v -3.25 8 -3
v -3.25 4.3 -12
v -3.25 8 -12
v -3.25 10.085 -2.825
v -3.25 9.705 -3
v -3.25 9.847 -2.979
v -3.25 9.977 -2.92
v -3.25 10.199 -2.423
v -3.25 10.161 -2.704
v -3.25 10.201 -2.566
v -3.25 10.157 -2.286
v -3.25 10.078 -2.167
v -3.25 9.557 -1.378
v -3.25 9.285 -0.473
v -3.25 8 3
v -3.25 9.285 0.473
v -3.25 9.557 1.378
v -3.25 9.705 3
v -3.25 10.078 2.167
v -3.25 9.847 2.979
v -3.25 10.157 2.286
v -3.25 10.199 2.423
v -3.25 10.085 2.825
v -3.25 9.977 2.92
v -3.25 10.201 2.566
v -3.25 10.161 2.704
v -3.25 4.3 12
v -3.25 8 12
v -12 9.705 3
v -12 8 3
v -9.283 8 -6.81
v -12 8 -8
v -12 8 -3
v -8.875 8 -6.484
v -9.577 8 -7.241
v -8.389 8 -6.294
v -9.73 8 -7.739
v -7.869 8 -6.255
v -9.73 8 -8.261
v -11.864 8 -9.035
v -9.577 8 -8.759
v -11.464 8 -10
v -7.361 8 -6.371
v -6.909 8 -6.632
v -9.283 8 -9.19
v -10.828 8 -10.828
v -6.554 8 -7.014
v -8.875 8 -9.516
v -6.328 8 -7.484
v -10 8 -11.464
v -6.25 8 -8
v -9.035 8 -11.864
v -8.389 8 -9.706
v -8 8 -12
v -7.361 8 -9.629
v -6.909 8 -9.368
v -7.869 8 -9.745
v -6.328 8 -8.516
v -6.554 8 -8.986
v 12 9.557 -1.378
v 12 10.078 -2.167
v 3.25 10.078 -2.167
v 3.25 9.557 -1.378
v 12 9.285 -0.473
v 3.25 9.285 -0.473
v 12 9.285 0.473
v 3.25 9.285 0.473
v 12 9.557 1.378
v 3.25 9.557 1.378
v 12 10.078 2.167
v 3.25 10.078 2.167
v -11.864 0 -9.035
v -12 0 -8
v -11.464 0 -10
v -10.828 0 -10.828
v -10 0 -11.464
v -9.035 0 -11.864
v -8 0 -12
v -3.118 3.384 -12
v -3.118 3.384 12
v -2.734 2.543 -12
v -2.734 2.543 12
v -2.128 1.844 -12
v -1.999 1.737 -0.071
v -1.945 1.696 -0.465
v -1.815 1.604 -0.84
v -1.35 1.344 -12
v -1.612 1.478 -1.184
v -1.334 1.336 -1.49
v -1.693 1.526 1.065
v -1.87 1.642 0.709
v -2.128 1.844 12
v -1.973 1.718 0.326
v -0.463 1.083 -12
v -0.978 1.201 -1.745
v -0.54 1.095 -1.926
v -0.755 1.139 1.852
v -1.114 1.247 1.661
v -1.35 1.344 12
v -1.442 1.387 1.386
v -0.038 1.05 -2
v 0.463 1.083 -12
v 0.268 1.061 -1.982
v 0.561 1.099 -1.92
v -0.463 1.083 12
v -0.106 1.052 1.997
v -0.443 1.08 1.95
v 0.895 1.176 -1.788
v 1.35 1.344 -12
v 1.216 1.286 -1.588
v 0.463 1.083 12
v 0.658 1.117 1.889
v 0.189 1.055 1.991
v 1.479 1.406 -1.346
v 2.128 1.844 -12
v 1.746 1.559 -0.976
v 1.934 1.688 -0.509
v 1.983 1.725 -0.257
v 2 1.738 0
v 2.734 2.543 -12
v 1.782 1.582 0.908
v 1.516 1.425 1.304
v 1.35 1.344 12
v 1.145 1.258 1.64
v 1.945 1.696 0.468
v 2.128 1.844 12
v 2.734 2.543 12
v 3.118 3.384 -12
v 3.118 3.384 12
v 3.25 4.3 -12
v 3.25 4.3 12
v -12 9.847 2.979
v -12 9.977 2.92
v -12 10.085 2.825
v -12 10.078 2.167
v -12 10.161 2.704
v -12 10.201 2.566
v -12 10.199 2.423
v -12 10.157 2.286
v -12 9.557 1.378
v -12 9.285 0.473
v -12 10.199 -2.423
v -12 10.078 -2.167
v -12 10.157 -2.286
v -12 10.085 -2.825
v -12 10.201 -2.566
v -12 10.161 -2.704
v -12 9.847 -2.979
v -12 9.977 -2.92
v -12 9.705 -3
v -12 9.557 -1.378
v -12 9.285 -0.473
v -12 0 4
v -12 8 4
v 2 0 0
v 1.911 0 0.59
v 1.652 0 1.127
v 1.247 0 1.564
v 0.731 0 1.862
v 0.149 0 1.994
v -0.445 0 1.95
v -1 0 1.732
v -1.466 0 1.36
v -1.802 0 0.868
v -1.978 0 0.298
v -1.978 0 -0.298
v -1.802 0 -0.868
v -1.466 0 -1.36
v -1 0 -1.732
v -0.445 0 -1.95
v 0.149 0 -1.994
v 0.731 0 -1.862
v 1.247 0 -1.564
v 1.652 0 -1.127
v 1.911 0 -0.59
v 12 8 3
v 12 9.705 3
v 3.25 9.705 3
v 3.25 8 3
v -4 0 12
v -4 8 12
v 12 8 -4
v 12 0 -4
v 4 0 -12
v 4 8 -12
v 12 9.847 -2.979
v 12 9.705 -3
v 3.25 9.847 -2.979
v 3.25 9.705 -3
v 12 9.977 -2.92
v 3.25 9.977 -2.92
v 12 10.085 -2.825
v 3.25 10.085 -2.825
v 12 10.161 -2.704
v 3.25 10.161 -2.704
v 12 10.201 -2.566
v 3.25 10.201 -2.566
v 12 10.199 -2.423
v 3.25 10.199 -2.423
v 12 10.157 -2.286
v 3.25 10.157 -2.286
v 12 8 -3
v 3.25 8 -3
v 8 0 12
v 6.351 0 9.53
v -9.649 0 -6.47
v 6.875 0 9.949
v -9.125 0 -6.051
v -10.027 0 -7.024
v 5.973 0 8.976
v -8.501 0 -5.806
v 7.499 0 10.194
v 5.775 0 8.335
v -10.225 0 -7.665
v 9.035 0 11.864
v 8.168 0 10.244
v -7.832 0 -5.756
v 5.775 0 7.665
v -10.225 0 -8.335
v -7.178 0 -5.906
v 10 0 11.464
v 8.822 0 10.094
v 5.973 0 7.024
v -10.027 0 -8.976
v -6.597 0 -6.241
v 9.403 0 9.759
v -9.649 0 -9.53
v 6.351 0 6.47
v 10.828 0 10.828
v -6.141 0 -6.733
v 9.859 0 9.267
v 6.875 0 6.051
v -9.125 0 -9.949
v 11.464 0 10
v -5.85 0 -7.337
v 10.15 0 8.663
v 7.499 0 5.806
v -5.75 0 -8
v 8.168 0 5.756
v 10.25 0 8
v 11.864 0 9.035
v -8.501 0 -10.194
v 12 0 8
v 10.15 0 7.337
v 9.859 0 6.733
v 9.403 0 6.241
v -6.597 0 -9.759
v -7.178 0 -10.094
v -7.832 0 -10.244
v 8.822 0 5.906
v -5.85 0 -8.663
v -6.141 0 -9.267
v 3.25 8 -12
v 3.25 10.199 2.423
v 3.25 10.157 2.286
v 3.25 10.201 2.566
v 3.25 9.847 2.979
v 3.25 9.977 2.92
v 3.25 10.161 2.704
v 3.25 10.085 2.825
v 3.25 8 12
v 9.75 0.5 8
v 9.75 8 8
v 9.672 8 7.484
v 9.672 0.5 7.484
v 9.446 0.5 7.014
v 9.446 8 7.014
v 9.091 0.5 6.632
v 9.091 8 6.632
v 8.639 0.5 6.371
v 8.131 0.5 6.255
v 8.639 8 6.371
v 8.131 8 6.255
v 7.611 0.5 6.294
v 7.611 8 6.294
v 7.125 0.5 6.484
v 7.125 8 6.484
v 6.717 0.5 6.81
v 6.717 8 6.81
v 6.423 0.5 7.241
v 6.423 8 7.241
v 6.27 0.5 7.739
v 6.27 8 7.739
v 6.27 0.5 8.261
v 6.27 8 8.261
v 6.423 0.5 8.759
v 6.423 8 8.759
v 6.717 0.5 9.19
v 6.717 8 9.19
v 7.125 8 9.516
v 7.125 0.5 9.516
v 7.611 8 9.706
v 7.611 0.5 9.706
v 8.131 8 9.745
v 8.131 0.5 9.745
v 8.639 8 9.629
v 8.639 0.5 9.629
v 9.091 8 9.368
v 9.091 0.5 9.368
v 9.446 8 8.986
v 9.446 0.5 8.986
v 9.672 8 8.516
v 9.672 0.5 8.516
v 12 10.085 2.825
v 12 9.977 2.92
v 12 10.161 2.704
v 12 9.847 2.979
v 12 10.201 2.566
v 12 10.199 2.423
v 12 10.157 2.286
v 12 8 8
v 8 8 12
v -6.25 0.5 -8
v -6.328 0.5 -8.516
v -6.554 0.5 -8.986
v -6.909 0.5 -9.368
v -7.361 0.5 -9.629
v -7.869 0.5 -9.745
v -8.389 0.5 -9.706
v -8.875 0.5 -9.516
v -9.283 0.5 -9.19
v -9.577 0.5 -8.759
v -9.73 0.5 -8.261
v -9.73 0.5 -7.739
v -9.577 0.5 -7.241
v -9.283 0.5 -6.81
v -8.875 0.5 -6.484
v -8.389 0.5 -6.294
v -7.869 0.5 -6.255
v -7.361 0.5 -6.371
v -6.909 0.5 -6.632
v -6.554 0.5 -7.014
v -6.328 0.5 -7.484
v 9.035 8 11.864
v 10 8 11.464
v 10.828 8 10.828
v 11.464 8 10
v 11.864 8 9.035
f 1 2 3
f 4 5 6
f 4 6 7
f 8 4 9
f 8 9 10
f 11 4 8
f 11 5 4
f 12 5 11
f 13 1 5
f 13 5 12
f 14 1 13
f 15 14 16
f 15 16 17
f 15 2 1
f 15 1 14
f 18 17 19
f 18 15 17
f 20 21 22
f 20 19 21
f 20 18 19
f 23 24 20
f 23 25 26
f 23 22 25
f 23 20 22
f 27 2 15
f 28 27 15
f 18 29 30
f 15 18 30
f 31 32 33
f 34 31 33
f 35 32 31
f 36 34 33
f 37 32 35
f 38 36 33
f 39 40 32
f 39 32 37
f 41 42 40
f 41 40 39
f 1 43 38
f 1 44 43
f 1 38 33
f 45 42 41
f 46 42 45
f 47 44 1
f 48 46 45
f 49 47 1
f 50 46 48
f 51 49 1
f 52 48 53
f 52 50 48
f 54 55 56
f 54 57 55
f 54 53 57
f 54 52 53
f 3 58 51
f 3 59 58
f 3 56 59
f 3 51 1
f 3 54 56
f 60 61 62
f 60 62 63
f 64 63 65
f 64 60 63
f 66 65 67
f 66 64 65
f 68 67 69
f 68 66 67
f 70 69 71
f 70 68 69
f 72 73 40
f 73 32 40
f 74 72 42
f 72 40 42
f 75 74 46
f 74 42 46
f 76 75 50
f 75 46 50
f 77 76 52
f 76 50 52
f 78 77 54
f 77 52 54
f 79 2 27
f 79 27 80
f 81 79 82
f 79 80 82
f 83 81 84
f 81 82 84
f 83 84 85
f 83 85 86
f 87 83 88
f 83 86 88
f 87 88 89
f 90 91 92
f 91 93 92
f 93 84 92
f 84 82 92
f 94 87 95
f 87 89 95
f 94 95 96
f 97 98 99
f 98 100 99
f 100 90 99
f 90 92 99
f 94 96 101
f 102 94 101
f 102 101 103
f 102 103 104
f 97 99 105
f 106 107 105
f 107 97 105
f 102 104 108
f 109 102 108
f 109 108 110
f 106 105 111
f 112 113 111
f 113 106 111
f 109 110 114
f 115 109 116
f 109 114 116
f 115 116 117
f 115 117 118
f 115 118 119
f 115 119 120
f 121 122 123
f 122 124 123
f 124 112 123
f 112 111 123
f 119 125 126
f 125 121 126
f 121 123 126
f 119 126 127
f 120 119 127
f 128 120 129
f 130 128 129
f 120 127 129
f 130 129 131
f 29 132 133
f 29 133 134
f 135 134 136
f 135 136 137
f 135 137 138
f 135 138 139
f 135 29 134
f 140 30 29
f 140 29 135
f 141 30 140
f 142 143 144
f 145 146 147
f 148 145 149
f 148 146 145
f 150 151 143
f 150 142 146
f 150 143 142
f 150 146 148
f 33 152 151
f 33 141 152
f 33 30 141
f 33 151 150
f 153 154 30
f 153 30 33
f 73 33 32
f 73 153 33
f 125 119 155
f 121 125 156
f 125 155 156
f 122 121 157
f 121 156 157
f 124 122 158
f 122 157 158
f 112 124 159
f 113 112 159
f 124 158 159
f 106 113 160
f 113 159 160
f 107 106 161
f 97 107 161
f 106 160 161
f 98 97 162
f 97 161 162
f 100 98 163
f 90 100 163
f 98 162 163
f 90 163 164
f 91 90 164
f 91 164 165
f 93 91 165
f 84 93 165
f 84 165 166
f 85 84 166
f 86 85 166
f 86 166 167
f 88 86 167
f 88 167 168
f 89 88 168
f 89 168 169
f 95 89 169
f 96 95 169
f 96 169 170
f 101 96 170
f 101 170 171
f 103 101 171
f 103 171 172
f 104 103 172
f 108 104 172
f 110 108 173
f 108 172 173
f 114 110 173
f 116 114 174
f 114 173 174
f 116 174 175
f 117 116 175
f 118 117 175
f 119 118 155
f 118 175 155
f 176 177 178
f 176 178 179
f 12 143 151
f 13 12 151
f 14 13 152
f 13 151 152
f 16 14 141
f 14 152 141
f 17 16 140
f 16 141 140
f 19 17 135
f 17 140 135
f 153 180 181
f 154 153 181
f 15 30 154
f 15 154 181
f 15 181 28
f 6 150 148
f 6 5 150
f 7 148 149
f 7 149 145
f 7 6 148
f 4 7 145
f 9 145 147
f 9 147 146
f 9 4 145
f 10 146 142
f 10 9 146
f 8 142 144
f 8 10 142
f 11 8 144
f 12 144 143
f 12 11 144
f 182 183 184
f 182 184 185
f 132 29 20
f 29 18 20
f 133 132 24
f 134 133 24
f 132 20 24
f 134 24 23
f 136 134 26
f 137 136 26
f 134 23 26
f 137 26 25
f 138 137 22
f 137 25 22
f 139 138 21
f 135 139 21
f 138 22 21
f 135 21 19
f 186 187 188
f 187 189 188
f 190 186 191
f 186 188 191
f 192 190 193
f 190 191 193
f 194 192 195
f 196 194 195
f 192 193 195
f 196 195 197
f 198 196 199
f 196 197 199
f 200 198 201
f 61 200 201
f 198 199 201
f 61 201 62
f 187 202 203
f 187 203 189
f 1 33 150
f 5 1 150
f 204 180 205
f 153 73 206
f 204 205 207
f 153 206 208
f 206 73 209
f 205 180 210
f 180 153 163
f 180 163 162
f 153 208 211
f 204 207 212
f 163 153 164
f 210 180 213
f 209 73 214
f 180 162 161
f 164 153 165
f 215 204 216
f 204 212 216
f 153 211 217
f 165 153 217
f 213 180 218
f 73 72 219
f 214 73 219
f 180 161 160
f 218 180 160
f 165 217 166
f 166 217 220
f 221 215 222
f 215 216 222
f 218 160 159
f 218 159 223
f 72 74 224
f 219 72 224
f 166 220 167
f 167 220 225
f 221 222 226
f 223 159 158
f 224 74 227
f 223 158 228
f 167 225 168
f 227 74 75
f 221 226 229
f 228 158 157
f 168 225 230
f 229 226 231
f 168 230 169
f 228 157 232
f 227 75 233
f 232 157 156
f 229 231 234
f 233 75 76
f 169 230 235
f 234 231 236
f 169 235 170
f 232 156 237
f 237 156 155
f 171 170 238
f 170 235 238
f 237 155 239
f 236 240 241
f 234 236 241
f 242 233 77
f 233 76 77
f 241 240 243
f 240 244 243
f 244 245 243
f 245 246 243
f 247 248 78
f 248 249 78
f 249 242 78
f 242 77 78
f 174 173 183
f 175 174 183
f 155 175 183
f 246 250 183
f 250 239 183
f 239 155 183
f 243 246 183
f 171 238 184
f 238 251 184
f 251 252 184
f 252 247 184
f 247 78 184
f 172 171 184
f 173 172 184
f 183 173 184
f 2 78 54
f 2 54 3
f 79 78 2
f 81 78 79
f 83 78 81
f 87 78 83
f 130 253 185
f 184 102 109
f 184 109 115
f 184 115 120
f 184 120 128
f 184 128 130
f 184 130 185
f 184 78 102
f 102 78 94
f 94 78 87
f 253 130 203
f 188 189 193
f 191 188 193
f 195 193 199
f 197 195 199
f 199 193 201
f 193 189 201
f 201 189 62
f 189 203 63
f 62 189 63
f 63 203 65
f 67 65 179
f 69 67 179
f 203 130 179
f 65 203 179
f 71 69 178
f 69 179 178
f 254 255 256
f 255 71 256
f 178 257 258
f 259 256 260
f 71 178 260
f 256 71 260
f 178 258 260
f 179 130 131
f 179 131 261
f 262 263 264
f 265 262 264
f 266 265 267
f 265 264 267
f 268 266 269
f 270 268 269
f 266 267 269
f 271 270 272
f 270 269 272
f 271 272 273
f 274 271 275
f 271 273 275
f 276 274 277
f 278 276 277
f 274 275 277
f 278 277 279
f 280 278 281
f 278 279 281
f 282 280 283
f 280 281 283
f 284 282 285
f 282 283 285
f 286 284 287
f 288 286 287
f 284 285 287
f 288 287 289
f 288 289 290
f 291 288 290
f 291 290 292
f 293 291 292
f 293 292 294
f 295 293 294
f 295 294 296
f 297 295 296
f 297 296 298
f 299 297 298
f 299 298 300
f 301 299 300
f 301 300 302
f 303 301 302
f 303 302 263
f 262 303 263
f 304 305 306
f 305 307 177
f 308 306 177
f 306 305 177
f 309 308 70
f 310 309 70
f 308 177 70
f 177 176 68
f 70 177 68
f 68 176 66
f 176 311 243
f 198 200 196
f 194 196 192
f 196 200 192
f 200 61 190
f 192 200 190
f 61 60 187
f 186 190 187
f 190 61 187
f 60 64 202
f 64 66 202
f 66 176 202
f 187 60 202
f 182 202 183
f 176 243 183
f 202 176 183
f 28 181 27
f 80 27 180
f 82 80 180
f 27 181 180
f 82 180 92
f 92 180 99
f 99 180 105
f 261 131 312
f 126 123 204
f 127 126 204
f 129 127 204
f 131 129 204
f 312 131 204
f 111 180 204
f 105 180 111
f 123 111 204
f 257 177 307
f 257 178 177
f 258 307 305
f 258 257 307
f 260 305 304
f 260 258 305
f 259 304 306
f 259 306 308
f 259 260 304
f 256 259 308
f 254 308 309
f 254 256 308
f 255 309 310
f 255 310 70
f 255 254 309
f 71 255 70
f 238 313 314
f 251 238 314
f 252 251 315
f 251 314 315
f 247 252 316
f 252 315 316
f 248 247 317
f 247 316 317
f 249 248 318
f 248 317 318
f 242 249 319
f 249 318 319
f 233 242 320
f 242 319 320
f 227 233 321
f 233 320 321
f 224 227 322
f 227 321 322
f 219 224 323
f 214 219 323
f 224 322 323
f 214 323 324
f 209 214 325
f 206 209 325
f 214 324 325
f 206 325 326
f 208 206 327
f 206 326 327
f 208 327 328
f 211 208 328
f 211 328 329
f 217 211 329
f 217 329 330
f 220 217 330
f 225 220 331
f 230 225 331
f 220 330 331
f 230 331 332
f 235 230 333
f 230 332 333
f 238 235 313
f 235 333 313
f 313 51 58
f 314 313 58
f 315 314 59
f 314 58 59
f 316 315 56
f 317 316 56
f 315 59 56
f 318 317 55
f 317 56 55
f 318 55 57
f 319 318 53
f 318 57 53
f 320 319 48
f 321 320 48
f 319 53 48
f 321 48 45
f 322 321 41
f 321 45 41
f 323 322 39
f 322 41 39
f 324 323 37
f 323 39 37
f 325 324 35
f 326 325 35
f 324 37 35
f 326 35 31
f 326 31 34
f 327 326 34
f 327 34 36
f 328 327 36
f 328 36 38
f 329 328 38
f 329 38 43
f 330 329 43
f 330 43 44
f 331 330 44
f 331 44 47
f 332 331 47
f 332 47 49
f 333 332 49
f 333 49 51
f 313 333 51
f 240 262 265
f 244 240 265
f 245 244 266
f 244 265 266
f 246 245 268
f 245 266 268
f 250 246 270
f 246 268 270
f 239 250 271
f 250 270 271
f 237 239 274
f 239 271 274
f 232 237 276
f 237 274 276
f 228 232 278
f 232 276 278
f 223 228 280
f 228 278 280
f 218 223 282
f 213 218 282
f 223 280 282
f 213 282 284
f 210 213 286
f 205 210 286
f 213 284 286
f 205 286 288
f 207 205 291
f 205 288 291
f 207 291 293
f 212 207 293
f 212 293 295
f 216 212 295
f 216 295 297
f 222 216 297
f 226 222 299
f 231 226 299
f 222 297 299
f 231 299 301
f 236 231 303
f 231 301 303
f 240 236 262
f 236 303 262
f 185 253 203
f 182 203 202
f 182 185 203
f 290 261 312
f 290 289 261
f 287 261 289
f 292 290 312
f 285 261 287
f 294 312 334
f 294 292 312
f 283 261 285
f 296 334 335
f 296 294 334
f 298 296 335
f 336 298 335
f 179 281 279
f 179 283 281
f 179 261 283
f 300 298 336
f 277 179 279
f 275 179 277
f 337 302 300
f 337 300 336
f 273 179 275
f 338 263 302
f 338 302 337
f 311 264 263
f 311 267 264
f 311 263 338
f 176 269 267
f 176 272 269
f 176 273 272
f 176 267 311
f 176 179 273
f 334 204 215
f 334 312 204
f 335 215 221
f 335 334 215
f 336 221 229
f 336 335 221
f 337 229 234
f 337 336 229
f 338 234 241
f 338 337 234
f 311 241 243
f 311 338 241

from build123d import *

# Parameters (mm, degrees)
SKETCH_1_W               = 24
SKETCH_1_H               = 24
EXTRUDE_1_DEPTH          = 8
SKETCH_2_R               = 3.25
SKETCH_2_W               = 6.5
SKETCH_2_H               = 3.7
CUT_EXTRUDE_1_DEPTH      = 1
CUT_EXTRUDE_1_DEPTH_BACK = 25
EXTRUDE_2_DEPTH          = 8.75
SKETCH_5_R               = 1.75
CUT_EXTRUDE_3_DEPTH      = 9
CHAMFER_1_SIZE           = 8
FILLET_1_R               = 4
FILLET_2_R               = 0.5
SKETCH_9_R               = 2
CUT_EXTRUDE_4_DEPTH      = 11.204915028
CHAMFER_3_SIZE           = 0.5


with BuildPart() as part:
    # 草图1 → 凸台-拉伸1 (new body)
    with BuildSketch(Plane(origin=(0, 0, 0), x_dir=(1, 0, 0), z_dir=(0, 1, 0))):
        Rectangle(SKETCH_1_W, SKETCH_1_H)
    extrude(amount=EXTRUDE_1_DEPTH)

    # 草图2 → 切除-拉伸1 (cut, two sides)
    with BuildSketch(Plane.XY.offset(12)) as cut_extrude_1_sk:
        with Locations((0, 4.3)):
            Circle(SKETCH_2_R)
        with Locations((0, 6.15)):
            Rectangle(SKETCH_2_W, SKETCH_2_H)
    extrude(amount=CUT_EXTRUDE_1_DEPTH, mode=Mode.SUBTRACT)
    extrude(cut_extrude_1_sk.sketch, amount=-CUT_EXTRUDE_1_DEPTH_BACK, mode=Mode.SUBTRACT)

    # 草图4 → 凸台-拉伸2 (add)
    with BuildSketch(Plane(origin=(12, 0, 0), x_dir=(0, 0, -1), z_dir=(1, 0, 0))):
        with BuildLine():
            Line((-3, 8), (3, 8))
            Line((3, 8), (3, 11.25))
            ThreePointArc((3, 11.25), (0, 9.25), (-3, 11.25))
            Line((-3, 11.25), (-3, 8))
        make_face()
    extrude_2 = extrude(amount=-EXTRUDE_2_DEPTH)

    # 镜向2: 凸台-拉伸2 across plane
    add(extrude_2.mirror(Plane(origin=(0, 0, 0), x_dir=(0, 0, 1), z_dir=(1, 0, 0))))

    # 草图5 → 切除-拉伸3 (cut, through all)
    with BuildSketch(Plane(origin=(0, 8, 0), x_dir=(1, 0, 0), z_dir=(0, 1, 0))):
        with Locations((-8, 8)):
            Circle(SKETCH_5_R)
        with Locations((8, -8)):
            Circle(SKETCH_5_R)
    extrude(amount=-CUT_EXTRUDE_3_DEPTH, mode=Mode.SUBTRACT)

    # 倒角1
    chamfer_1_edges = [part.edges().sort_by_distance(p)[0] for p in [
        (-12, 4, 12),
        (12, 4, -12),
    ]]
    chamfer(chamfer_1_edges, length=CHAMFER_1_SIZE)

    # 圆角1
    fillet_1_edges = [part.edges().sort_by_distance(p)[0] for p in [
        (12, 4, 12),
        (-12, 4, -12),
    ]]
    fillet(fillet_1_edges, radius=FILLET_1_R)

    # 圆角2
    fillet_2_edges = [part.edges().sort_by_distance(p)[0] for p in [
        (7.625, 11.25, 3),
        (7.625, 11.25, -3),
        (-7.625, 11.25, -3),
        (-7.625, 11.25, 3),
    ]]
    fillet(fillet_2_edges, radius=FILLET_2_R)

    # 草图9 → 切除-拉伸4 (cut, through all)
    with BuildSketch(Plane.XZ):
        Circle(SKETCH_9_R)
    extrude(amount=-CUT_EXTRUDE_4_DEPTH, mode=Mode.SUBTRACT)

    # 倒角3
    chamfer_3_edges = [part.edges().sort_by_distance(p)[0] for p in [
        (-9.75, 0, -8),
        (6.25, 0, 8),
    ]]
    chamfer(chamfer_3_edges, length=CHAMFER_3_SIZE)


solid = part.part
